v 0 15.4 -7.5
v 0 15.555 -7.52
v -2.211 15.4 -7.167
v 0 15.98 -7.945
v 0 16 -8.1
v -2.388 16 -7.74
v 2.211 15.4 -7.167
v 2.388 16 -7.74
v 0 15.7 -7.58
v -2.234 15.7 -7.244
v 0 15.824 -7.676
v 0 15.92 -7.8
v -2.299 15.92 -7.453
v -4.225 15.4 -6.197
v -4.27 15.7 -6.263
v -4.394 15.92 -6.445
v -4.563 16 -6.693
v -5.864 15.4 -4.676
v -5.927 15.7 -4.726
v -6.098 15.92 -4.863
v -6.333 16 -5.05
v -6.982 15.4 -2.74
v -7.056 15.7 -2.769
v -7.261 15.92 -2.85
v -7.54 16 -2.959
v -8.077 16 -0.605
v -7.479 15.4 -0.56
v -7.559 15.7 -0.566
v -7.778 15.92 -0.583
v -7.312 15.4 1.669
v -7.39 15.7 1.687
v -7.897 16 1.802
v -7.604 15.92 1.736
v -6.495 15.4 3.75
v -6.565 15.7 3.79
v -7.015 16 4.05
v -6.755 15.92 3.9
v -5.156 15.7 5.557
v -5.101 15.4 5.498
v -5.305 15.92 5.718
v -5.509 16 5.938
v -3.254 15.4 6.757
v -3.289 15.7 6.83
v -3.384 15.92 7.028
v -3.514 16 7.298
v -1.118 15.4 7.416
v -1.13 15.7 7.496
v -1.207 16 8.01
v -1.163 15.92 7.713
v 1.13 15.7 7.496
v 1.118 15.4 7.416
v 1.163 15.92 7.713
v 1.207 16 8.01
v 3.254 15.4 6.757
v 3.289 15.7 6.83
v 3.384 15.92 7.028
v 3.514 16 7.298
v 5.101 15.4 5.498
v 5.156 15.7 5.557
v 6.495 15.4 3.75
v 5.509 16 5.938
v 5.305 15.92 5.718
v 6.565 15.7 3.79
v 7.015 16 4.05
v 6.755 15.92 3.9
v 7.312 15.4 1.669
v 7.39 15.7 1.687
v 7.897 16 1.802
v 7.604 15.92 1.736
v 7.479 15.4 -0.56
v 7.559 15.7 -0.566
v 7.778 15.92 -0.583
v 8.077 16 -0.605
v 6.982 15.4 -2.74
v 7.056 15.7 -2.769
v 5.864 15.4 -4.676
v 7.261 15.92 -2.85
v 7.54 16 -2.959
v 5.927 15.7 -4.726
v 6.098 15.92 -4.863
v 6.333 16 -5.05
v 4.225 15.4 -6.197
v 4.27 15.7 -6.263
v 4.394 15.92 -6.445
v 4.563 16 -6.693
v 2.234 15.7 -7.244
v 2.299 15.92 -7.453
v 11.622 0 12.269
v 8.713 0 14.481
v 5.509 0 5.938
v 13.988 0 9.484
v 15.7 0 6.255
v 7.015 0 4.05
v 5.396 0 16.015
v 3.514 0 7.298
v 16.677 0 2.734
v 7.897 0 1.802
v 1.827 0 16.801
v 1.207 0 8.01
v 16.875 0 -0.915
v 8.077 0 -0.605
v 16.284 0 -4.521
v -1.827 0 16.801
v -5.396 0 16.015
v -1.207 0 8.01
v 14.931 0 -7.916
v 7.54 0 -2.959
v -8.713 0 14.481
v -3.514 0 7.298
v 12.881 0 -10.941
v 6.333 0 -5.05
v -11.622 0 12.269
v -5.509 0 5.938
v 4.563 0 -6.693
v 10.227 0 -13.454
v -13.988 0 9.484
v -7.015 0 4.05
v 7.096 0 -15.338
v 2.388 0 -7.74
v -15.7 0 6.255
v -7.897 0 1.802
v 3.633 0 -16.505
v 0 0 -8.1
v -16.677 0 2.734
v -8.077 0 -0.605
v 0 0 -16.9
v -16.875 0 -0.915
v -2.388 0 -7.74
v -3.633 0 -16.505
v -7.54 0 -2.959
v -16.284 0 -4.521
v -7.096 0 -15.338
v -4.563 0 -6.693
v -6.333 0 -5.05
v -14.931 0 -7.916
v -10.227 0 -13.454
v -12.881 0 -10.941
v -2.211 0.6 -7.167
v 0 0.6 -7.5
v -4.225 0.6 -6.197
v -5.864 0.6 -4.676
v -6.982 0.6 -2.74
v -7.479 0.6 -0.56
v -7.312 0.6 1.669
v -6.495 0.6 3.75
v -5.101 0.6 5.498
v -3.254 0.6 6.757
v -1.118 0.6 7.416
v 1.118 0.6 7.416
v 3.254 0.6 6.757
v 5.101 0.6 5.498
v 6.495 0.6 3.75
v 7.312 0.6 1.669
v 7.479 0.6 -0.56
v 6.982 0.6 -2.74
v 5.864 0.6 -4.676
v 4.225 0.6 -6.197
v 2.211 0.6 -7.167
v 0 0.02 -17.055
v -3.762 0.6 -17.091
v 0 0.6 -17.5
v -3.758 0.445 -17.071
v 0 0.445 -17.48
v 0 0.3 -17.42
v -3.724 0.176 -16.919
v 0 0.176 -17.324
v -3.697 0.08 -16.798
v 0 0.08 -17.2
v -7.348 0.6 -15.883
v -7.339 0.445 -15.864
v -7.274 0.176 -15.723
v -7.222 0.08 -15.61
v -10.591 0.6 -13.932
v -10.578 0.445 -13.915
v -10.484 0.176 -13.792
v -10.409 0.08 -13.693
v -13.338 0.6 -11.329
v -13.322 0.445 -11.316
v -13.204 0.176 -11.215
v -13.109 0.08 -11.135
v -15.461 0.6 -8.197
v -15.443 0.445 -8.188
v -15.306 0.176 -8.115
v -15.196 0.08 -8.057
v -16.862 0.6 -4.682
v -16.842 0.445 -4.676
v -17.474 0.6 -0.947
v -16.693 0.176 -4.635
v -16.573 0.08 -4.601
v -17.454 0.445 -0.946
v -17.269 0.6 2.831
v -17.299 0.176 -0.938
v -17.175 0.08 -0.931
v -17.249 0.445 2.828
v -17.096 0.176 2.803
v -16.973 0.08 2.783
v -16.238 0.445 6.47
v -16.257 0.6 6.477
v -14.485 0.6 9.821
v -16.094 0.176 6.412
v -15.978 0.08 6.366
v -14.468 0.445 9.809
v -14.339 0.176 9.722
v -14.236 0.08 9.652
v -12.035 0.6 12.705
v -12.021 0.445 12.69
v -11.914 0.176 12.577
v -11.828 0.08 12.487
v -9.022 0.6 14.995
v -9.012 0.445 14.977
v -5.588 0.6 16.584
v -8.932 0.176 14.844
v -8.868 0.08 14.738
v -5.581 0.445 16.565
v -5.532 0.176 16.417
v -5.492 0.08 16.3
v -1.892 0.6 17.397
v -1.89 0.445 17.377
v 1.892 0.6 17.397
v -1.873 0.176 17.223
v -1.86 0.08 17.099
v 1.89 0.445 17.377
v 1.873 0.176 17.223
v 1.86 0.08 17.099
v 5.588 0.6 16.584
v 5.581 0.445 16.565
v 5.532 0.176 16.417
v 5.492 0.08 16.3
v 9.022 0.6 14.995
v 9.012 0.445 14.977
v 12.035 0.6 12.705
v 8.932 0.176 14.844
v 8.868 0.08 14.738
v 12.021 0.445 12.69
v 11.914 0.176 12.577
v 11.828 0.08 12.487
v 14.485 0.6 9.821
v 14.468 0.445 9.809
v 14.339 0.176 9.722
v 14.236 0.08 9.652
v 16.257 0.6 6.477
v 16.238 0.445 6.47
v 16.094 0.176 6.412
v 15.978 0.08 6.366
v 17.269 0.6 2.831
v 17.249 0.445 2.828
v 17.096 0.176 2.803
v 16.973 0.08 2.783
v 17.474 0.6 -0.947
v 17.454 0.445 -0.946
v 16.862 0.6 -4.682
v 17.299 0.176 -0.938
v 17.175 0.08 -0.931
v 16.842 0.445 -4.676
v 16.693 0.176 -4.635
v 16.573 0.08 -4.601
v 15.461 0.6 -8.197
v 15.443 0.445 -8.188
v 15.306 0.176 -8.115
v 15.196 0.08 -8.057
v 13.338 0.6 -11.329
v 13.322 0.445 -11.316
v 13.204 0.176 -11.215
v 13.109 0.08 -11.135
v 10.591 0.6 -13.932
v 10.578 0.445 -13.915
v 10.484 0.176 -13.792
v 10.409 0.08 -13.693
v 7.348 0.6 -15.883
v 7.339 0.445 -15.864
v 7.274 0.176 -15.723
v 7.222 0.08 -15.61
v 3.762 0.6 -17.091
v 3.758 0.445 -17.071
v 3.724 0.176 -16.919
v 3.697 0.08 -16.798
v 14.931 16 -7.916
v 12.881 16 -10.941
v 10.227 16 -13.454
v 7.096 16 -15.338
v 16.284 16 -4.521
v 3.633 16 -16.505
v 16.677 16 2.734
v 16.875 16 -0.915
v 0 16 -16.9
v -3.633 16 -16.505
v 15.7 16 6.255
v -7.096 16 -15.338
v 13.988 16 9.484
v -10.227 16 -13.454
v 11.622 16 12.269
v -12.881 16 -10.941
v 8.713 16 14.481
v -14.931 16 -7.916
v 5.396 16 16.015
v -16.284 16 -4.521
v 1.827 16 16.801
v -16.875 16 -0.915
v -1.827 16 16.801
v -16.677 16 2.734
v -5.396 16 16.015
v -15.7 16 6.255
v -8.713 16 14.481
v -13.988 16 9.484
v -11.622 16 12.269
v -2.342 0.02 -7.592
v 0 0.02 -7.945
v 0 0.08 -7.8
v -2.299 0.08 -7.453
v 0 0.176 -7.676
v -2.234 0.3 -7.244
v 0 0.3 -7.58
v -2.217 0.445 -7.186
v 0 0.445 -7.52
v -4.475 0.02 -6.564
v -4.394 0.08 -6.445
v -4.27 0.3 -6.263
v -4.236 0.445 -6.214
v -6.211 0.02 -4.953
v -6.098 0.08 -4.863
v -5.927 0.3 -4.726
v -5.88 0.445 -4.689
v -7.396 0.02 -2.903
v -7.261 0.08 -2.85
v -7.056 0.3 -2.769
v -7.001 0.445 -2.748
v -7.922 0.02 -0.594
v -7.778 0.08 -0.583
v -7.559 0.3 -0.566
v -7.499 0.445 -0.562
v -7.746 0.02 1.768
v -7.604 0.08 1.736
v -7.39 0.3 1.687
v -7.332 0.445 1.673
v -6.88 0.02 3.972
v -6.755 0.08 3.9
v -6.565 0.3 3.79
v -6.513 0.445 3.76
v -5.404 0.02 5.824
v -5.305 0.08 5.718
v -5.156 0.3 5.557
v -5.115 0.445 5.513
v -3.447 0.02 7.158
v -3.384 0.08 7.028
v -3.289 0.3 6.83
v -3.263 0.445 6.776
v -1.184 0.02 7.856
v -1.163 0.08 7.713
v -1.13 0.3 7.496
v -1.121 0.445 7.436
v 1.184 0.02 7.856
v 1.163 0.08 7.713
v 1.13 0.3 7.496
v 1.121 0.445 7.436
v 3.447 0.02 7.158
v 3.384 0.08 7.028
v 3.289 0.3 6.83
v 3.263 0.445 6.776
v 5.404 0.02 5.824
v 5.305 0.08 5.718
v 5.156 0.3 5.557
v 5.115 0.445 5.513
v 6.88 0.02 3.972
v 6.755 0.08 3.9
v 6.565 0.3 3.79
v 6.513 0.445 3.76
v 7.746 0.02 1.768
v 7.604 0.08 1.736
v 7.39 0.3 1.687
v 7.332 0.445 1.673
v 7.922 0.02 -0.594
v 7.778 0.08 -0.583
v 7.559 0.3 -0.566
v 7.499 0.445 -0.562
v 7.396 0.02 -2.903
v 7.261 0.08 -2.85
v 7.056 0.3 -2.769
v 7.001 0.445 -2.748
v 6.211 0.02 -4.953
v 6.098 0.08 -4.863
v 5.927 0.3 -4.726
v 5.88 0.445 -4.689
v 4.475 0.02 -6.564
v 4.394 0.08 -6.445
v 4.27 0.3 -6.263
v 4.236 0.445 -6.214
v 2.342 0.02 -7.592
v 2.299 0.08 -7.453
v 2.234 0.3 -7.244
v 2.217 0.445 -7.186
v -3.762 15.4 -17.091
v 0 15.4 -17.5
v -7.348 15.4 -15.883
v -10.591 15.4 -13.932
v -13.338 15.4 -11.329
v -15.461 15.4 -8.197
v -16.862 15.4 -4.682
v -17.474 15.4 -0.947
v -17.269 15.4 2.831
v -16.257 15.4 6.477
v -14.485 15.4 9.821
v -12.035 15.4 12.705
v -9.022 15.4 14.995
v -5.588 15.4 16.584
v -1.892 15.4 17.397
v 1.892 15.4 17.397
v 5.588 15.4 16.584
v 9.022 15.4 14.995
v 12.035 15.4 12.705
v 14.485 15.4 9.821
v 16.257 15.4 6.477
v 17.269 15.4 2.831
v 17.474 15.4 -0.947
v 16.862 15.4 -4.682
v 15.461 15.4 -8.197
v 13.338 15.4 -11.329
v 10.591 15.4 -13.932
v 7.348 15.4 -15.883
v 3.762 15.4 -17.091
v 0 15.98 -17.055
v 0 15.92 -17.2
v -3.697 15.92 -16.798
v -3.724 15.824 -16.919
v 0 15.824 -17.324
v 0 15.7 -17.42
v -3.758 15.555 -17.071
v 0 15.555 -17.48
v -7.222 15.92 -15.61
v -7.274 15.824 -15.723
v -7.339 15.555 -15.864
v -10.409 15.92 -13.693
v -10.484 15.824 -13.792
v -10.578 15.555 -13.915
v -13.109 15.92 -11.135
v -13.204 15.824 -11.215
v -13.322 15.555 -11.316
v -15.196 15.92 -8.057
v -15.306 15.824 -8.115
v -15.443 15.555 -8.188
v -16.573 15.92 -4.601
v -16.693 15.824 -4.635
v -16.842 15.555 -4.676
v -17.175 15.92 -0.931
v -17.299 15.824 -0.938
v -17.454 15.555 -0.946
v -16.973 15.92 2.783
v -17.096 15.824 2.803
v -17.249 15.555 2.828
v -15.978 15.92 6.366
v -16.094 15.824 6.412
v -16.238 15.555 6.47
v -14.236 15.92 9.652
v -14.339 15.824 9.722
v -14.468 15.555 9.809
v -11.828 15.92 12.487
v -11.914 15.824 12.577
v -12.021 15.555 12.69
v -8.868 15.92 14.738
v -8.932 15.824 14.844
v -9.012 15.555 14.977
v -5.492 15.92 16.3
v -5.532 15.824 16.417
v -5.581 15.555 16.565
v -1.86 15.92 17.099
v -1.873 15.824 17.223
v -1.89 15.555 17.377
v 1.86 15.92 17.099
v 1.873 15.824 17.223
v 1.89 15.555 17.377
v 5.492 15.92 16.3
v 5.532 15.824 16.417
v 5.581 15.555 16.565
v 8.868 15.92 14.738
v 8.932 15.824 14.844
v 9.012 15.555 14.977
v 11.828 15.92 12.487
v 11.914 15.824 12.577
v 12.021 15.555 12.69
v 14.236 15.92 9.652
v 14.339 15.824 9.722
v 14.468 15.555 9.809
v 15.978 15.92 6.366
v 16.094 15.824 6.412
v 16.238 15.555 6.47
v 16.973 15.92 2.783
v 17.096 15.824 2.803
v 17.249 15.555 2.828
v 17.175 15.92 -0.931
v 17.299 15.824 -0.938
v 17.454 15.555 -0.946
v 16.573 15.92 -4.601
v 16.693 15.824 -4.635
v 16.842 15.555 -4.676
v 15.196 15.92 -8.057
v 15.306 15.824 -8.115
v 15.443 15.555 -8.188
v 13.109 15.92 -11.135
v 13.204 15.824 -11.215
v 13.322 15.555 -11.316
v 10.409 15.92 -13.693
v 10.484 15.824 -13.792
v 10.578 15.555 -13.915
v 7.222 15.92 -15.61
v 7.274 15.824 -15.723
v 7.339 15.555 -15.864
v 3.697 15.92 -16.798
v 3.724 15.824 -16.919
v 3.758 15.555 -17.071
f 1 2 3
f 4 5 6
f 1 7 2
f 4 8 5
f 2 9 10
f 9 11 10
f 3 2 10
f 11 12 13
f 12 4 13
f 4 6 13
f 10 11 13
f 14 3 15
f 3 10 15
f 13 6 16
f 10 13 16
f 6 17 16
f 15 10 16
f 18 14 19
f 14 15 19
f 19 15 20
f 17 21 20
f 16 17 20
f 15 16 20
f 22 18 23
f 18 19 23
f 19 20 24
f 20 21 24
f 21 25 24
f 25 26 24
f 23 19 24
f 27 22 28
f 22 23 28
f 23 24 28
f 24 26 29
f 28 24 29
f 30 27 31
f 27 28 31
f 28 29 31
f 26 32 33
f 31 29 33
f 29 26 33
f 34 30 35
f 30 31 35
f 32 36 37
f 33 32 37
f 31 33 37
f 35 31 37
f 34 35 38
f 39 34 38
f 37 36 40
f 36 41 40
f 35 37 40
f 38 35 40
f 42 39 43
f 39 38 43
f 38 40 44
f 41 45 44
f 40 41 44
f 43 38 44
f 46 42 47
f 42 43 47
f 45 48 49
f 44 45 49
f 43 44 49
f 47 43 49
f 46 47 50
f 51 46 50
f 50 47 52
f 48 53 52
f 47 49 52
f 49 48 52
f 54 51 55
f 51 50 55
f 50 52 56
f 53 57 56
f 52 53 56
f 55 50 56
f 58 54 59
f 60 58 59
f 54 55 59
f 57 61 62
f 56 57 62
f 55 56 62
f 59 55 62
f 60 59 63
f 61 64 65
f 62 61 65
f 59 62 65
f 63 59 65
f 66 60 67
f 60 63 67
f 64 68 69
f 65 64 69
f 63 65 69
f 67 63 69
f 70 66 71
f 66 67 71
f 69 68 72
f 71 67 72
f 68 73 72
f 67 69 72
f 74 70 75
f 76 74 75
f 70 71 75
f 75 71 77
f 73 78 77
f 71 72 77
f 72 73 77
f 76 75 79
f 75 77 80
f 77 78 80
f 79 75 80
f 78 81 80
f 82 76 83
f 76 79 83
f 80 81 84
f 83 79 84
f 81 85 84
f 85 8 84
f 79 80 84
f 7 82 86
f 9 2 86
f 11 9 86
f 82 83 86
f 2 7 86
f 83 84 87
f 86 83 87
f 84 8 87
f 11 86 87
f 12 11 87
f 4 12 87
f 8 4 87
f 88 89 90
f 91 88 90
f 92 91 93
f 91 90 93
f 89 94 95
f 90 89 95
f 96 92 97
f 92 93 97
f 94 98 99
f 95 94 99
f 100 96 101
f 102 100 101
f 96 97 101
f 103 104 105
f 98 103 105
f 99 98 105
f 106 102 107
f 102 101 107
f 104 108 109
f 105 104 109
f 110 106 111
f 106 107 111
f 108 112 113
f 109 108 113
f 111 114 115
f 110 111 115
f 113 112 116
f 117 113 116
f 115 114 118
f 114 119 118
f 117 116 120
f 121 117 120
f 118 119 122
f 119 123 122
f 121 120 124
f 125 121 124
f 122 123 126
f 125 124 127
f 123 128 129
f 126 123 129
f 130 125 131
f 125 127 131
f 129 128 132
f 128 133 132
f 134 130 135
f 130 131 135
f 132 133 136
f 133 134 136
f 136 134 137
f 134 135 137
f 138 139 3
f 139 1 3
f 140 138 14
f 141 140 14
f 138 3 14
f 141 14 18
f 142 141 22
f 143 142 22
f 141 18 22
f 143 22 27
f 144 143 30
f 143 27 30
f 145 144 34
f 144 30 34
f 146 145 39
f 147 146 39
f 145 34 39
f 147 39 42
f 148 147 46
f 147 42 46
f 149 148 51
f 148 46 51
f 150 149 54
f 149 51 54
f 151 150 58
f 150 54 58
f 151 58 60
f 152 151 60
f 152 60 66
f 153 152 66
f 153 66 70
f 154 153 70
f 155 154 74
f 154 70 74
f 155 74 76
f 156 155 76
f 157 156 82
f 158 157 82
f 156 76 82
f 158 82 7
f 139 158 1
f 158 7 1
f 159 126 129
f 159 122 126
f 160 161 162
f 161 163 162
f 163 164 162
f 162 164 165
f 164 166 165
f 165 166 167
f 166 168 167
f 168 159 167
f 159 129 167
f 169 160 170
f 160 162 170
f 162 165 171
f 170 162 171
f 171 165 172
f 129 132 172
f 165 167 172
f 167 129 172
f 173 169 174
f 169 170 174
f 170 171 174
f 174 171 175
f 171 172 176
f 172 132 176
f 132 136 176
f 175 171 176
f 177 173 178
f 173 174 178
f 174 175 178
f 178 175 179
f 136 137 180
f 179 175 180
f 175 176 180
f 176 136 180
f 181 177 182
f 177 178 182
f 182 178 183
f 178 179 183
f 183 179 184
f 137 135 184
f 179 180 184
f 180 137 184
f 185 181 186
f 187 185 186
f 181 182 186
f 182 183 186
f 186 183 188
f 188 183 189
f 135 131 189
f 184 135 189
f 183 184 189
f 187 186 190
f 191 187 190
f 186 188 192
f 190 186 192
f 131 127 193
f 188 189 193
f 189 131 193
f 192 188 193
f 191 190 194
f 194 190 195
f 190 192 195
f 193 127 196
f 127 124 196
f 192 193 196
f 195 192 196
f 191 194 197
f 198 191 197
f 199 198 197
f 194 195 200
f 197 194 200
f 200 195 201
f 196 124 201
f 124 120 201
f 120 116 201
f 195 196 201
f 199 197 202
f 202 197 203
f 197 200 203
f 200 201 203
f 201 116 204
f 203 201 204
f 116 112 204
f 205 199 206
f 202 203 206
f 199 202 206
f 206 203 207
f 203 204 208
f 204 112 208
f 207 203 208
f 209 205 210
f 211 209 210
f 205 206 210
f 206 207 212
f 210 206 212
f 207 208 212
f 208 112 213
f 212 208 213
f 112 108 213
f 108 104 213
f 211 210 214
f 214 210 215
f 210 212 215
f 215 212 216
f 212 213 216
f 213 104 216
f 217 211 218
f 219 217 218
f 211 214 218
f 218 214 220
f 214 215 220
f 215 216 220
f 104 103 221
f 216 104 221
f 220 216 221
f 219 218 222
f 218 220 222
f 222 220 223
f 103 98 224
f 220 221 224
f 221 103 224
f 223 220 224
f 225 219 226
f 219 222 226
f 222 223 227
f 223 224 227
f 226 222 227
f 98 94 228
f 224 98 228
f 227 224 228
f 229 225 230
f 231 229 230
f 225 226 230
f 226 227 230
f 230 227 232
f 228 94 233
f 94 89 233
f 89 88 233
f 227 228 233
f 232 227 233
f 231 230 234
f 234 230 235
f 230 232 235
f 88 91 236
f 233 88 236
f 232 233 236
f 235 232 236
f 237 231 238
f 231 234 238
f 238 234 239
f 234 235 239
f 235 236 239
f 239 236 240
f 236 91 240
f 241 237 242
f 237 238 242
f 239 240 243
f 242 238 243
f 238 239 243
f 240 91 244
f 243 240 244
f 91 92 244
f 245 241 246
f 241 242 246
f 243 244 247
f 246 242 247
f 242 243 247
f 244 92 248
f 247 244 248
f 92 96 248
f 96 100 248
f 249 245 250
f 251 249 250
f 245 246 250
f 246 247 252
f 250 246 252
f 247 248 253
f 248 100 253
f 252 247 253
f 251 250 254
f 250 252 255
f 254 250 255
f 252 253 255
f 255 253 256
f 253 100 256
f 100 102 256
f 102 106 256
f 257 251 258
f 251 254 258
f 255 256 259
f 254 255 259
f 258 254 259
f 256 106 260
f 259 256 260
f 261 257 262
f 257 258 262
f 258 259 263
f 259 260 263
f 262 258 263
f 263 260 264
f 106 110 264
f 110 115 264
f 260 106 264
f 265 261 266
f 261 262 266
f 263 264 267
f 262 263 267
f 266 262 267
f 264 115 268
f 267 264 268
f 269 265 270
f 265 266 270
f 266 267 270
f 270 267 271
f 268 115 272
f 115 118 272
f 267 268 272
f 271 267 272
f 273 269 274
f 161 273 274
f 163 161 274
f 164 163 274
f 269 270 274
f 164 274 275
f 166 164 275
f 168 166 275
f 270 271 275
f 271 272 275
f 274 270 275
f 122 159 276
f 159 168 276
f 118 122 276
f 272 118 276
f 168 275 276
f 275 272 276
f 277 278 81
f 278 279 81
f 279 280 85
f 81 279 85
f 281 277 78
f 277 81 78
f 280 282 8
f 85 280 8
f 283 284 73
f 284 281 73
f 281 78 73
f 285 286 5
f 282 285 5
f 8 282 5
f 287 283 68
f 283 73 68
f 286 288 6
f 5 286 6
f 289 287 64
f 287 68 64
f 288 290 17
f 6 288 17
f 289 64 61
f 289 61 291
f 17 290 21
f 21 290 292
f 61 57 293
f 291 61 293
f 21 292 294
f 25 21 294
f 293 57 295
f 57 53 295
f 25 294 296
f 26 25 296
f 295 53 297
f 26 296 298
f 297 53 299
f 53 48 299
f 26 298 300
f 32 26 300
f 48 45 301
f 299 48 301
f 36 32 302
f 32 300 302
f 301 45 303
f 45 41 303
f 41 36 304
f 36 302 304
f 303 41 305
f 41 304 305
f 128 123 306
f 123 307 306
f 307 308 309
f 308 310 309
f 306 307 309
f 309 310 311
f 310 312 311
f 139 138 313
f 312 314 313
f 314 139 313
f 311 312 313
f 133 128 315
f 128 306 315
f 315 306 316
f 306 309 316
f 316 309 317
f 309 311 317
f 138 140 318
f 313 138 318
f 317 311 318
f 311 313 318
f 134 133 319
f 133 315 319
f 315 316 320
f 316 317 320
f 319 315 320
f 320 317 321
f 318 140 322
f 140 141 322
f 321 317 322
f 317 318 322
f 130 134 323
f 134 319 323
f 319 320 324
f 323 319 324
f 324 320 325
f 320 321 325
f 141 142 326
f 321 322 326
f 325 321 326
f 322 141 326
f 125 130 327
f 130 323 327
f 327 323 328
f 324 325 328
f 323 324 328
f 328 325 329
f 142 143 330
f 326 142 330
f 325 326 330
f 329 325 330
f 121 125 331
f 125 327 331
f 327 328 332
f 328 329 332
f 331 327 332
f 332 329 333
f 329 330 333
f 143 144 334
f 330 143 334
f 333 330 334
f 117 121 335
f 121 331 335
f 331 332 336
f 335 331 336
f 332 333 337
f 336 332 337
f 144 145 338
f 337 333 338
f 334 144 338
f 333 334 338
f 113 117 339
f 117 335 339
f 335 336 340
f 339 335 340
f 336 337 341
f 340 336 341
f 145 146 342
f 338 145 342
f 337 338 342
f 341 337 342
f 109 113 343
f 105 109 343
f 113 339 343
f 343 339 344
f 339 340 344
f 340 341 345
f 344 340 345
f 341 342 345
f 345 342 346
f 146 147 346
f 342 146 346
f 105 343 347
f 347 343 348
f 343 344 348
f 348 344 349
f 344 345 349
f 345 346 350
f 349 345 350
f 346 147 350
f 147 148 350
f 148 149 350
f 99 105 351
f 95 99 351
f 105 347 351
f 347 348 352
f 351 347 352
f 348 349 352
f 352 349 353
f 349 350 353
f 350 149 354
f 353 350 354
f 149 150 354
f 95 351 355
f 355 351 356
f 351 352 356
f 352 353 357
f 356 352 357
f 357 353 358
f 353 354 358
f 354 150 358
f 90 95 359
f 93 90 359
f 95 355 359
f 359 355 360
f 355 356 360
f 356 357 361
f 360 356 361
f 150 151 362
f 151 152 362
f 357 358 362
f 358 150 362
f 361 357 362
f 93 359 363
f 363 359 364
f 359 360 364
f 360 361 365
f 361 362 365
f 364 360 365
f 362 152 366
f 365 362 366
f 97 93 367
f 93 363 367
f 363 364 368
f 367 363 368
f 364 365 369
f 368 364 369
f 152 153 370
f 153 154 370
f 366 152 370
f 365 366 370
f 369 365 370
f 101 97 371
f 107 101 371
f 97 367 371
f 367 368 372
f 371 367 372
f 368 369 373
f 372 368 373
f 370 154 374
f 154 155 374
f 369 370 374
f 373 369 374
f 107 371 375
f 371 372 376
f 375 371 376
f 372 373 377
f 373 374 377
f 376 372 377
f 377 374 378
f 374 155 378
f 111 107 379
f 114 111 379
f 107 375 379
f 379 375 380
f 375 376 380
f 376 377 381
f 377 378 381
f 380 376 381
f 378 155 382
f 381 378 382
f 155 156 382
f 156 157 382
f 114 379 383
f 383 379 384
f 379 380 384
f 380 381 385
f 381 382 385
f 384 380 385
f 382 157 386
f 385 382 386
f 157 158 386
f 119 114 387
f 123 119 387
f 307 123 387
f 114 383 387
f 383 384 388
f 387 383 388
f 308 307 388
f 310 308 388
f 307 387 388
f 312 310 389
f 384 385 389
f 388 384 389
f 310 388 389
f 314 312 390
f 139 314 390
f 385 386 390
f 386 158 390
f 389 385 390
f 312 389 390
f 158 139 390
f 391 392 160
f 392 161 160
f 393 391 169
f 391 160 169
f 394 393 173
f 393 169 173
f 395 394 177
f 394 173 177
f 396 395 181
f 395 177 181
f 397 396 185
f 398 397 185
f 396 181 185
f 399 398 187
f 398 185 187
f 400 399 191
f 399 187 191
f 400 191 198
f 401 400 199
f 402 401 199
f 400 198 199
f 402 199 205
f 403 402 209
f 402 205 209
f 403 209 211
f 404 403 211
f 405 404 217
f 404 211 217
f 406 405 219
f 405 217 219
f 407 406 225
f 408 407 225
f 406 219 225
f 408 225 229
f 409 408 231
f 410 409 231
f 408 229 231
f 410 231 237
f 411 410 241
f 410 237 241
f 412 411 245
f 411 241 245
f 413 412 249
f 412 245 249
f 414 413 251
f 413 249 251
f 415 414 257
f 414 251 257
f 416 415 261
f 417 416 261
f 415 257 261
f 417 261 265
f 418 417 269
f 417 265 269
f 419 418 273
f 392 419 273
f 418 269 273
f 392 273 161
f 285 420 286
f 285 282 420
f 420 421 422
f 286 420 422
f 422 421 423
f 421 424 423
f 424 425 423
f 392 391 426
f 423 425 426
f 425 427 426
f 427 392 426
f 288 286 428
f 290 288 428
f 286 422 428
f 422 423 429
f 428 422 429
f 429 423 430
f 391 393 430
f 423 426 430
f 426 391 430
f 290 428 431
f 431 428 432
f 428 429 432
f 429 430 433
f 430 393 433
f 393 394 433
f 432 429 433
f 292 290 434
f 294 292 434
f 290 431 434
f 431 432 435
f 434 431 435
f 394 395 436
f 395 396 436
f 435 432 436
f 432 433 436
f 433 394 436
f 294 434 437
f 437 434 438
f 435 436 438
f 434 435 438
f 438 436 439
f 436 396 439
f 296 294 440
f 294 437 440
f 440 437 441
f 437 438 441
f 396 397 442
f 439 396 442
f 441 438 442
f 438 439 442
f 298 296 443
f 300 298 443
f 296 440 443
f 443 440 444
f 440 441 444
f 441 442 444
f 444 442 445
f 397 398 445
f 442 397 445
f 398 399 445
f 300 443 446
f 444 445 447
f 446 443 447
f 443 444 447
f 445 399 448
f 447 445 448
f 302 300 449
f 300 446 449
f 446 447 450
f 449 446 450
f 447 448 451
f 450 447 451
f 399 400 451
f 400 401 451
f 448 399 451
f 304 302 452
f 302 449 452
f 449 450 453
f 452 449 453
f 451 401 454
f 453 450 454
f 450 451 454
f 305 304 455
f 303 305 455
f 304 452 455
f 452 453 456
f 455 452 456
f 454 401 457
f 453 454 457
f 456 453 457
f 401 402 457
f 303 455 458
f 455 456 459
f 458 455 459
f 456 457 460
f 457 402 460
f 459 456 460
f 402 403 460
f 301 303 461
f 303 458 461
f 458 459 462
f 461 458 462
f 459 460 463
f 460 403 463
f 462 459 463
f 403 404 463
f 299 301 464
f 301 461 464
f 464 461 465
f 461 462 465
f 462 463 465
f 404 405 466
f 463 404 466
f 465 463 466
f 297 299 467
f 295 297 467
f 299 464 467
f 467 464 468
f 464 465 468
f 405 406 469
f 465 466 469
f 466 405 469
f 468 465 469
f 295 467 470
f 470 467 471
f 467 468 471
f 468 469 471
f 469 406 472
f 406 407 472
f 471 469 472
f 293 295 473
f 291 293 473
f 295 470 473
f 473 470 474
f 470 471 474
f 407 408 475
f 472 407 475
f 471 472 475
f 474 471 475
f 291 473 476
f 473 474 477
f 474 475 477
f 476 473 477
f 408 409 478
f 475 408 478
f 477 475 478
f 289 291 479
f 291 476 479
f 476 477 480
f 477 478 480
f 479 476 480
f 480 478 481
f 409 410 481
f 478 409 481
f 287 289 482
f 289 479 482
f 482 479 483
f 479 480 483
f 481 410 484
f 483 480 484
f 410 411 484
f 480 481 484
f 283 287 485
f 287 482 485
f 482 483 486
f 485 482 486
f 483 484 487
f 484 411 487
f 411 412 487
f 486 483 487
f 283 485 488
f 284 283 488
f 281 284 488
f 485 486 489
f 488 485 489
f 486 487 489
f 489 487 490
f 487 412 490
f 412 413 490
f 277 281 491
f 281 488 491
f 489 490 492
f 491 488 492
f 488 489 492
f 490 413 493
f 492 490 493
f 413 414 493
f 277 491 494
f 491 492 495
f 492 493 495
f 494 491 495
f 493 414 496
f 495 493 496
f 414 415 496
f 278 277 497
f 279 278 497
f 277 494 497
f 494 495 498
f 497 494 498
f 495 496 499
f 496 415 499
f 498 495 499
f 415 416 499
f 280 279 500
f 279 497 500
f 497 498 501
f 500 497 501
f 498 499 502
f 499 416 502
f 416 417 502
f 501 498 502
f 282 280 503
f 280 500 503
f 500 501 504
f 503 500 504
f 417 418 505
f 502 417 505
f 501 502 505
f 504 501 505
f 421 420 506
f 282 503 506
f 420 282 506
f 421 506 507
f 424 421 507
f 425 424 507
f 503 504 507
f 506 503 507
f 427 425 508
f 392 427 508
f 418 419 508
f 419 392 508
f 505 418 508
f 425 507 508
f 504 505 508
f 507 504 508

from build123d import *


with BuildPart() as part:
    # Szkic1 → Obrót1 (revolve)
    with BuildSketch(Plane.XY, mode=Mode.PRIVATE) as obr_t1_sk:
        with BuildLine():
            Line((-17.5, 15.4), (-17.5, 0.6))
            ThreePointArc((-17.5, 0.6), (-17.324264069, 0.175735931), (-16.9, 0))
            Line((-16.9, 0), (-8.1, 0))
            ThreePointArc((-8.1, 0), (-7.675735931, 0.175735931), (-7.5, 0.6))
            Line((-7.5, 0.6), (-7.5, 15.4))
            ThreePointArc((-7.5, 15.4), (-7.675735931, 15.824264069), (-8.1, 16))
            Line((-8.1, 16), (-16.9, 16))
            ThreePointArc((-16.9, 16), (-17.324264069, 15.824264069), (-17.5, 15.4))
        make_face()
    revolve(obr_t1_sk.sketch.rotate(Axis((0, 0, 0), (0, 1, 0)), 270), axis=Axis((0, 0, 0), (0, 1, 0)))


solid = part.part
